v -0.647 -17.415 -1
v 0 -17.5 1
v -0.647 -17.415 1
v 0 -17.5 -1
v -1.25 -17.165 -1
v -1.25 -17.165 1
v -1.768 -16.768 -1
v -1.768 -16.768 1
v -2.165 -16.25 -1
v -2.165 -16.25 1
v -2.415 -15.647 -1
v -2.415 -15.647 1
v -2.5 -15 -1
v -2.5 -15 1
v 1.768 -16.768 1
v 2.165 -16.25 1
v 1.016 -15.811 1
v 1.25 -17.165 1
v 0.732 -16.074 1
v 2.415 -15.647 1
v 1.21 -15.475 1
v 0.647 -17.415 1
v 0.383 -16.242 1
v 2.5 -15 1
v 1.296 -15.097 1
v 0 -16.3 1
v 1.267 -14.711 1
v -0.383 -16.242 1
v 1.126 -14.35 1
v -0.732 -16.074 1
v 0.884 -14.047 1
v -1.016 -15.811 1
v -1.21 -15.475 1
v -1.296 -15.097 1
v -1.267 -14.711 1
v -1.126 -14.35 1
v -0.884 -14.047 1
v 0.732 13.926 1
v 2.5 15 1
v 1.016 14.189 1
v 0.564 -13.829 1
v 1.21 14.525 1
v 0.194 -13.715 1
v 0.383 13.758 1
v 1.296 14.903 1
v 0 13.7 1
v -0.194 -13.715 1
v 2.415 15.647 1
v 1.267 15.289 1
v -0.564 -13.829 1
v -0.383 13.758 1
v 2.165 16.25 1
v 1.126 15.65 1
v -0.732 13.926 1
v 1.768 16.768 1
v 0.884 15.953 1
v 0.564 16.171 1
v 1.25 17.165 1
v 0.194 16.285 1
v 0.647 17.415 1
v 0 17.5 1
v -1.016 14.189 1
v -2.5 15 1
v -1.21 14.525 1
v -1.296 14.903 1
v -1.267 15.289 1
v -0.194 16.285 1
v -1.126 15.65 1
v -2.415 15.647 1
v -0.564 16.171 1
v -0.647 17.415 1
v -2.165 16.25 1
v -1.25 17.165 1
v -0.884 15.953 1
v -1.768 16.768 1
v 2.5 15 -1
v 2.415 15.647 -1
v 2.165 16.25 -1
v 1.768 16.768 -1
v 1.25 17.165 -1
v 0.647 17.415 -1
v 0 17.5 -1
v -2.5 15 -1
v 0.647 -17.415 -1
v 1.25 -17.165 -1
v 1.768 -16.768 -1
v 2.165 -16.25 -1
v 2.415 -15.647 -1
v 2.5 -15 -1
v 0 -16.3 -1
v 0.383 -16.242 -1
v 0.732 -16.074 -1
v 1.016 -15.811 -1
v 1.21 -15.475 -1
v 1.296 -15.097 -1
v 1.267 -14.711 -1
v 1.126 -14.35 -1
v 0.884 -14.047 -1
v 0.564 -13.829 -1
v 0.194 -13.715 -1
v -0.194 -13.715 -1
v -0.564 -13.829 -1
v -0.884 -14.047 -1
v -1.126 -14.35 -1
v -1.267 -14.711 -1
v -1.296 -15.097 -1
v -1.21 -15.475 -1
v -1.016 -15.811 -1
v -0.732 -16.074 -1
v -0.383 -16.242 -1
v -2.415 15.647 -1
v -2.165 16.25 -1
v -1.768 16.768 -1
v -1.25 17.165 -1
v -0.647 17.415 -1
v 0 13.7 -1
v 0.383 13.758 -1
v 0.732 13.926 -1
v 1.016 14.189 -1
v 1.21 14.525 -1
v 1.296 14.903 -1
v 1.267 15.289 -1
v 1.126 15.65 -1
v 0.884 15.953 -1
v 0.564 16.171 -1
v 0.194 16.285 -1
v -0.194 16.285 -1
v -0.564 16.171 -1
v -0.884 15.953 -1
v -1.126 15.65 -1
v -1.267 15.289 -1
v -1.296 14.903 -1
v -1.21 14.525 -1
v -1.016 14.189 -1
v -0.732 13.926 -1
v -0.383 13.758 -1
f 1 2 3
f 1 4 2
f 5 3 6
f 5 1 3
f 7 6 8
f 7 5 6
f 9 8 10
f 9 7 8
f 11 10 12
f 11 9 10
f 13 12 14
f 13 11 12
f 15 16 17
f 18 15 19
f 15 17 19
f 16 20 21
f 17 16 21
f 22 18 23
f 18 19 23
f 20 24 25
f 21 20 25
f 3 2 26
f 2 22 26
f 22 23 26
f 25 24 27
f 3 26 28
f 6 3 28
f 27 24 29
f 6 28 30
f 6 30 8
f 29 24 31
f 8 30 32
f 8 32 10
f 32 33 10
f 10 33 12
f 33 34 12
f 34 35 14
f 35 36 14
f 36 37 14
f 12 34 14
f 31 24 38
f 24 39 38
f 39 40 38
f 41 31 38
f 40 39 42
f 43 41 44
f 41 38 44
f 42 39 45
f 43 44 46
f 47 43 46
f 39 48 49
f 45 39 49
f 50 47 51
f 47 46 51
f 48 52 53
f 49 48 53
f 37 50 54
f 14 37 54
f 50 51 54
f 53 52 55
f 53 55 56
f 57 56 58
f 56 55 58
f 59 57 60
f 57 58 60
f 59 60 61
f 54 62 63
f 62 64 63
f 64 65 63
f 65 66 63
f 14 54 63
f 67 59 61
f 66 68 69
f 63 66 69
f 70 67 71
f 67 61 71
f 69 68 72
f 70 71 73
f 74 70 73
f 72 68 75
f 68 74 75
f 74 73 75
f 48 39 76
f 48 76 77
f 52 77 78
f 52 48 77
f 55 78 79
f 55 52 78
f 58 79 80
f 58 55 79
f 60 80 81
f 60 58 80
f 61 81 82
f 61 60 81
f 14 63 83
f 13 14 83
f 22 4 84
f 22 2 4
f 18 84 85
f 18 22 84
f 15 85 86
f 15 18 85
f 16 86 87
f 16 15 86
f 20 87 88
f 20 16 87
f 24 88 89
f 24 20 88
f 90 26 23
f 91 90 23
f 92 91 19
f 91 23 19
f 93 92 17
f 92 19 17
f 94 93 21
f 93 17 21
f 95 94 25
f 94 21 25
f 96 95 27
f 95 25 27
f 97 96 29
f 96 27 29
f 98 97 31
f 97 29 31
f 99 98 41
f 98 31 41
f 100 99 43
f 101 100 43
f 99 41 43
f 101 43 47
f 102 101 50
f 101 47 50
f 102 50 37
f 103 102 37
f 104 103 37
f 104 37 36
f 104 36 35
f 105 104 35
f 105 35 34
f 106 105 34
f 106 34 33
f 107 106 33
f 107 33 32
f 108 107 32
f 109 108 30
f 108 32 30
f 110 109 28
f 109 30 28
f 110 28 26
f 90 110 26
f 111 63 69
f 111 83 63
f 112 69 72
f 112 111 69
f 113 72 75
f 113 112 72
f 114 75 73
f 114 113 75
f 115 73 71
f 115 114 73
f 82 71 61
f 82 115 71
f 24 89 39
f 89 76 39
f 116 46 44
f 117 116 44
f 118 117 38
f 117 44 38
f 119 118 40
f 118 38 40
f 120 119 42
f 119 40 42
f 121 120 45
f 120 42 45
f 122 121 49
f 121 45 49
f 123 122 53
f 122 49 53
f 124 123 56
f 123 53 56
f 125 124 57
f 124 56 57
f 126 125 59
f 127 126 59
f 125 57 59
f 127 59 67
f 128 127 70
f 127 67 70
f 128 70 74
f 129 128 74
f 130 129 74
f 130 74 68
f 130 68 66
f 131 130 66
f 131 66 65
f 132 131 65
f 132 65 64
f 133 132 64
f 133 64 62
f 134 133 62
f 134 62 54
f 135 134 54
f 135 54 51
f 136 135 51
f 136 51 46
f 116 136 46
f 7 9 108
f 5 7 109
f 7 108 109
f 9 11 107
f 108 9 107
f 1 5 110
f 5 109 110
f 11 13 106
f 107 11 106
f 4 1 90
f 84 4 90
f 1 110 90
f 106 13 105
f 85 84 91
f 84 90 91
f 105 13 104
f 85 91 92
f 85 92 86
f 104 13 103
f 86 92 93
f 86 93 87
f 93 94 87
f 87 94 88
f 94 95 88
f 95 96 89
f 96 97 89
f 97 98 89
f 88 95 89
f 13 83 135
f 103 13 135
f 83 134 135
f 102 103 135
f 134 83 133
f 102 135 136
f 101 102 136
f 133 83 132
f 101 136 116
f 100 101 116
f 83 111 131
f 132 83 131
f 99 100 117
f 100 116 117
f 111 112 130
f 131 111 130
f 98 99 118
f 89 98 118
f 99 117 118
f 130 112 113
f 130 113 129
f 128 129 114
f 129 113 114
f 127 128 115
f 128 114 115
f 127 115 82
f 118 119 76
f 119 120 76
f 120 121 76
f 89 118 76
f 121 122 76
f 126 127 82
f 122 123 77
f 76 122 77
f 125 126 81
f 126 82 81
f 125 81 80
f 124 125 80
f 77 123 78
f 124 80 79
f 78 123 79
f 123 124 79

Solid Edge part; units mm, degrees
sketch "Sketch1" plane through (0, 0, 0) normal (0, -1, 0) x (1, 0, 0)
  line L0 (-2.5, -1) -> (2.5, -1)
  line L1 (2.5, -1) -> (2.5, 1)
  line L2 (2.5, 1) -> (-2.5, 1)
  line L3 (-2.5, 1) -> (-2.5, -1)
extrude "Protrusion1" add sketch "Sketch1" along normal mid plane 35
fillet "Round_2" radius 2.5 4 edges at (-2.5, -17.5, 0) (2.5, -17.5, 0) (2.5, 17.5, 0) (-2.5, 17.5, 0)
hole "Hole_2" at (0, -15, 1) direction (0, 0, -1) diameter 2.6 end through all
hole "Hole1" at (0, 15, 1) direction (0, 0, -1) diameter 2.6 end through all
properties material "ABS Plastic, high impact"
